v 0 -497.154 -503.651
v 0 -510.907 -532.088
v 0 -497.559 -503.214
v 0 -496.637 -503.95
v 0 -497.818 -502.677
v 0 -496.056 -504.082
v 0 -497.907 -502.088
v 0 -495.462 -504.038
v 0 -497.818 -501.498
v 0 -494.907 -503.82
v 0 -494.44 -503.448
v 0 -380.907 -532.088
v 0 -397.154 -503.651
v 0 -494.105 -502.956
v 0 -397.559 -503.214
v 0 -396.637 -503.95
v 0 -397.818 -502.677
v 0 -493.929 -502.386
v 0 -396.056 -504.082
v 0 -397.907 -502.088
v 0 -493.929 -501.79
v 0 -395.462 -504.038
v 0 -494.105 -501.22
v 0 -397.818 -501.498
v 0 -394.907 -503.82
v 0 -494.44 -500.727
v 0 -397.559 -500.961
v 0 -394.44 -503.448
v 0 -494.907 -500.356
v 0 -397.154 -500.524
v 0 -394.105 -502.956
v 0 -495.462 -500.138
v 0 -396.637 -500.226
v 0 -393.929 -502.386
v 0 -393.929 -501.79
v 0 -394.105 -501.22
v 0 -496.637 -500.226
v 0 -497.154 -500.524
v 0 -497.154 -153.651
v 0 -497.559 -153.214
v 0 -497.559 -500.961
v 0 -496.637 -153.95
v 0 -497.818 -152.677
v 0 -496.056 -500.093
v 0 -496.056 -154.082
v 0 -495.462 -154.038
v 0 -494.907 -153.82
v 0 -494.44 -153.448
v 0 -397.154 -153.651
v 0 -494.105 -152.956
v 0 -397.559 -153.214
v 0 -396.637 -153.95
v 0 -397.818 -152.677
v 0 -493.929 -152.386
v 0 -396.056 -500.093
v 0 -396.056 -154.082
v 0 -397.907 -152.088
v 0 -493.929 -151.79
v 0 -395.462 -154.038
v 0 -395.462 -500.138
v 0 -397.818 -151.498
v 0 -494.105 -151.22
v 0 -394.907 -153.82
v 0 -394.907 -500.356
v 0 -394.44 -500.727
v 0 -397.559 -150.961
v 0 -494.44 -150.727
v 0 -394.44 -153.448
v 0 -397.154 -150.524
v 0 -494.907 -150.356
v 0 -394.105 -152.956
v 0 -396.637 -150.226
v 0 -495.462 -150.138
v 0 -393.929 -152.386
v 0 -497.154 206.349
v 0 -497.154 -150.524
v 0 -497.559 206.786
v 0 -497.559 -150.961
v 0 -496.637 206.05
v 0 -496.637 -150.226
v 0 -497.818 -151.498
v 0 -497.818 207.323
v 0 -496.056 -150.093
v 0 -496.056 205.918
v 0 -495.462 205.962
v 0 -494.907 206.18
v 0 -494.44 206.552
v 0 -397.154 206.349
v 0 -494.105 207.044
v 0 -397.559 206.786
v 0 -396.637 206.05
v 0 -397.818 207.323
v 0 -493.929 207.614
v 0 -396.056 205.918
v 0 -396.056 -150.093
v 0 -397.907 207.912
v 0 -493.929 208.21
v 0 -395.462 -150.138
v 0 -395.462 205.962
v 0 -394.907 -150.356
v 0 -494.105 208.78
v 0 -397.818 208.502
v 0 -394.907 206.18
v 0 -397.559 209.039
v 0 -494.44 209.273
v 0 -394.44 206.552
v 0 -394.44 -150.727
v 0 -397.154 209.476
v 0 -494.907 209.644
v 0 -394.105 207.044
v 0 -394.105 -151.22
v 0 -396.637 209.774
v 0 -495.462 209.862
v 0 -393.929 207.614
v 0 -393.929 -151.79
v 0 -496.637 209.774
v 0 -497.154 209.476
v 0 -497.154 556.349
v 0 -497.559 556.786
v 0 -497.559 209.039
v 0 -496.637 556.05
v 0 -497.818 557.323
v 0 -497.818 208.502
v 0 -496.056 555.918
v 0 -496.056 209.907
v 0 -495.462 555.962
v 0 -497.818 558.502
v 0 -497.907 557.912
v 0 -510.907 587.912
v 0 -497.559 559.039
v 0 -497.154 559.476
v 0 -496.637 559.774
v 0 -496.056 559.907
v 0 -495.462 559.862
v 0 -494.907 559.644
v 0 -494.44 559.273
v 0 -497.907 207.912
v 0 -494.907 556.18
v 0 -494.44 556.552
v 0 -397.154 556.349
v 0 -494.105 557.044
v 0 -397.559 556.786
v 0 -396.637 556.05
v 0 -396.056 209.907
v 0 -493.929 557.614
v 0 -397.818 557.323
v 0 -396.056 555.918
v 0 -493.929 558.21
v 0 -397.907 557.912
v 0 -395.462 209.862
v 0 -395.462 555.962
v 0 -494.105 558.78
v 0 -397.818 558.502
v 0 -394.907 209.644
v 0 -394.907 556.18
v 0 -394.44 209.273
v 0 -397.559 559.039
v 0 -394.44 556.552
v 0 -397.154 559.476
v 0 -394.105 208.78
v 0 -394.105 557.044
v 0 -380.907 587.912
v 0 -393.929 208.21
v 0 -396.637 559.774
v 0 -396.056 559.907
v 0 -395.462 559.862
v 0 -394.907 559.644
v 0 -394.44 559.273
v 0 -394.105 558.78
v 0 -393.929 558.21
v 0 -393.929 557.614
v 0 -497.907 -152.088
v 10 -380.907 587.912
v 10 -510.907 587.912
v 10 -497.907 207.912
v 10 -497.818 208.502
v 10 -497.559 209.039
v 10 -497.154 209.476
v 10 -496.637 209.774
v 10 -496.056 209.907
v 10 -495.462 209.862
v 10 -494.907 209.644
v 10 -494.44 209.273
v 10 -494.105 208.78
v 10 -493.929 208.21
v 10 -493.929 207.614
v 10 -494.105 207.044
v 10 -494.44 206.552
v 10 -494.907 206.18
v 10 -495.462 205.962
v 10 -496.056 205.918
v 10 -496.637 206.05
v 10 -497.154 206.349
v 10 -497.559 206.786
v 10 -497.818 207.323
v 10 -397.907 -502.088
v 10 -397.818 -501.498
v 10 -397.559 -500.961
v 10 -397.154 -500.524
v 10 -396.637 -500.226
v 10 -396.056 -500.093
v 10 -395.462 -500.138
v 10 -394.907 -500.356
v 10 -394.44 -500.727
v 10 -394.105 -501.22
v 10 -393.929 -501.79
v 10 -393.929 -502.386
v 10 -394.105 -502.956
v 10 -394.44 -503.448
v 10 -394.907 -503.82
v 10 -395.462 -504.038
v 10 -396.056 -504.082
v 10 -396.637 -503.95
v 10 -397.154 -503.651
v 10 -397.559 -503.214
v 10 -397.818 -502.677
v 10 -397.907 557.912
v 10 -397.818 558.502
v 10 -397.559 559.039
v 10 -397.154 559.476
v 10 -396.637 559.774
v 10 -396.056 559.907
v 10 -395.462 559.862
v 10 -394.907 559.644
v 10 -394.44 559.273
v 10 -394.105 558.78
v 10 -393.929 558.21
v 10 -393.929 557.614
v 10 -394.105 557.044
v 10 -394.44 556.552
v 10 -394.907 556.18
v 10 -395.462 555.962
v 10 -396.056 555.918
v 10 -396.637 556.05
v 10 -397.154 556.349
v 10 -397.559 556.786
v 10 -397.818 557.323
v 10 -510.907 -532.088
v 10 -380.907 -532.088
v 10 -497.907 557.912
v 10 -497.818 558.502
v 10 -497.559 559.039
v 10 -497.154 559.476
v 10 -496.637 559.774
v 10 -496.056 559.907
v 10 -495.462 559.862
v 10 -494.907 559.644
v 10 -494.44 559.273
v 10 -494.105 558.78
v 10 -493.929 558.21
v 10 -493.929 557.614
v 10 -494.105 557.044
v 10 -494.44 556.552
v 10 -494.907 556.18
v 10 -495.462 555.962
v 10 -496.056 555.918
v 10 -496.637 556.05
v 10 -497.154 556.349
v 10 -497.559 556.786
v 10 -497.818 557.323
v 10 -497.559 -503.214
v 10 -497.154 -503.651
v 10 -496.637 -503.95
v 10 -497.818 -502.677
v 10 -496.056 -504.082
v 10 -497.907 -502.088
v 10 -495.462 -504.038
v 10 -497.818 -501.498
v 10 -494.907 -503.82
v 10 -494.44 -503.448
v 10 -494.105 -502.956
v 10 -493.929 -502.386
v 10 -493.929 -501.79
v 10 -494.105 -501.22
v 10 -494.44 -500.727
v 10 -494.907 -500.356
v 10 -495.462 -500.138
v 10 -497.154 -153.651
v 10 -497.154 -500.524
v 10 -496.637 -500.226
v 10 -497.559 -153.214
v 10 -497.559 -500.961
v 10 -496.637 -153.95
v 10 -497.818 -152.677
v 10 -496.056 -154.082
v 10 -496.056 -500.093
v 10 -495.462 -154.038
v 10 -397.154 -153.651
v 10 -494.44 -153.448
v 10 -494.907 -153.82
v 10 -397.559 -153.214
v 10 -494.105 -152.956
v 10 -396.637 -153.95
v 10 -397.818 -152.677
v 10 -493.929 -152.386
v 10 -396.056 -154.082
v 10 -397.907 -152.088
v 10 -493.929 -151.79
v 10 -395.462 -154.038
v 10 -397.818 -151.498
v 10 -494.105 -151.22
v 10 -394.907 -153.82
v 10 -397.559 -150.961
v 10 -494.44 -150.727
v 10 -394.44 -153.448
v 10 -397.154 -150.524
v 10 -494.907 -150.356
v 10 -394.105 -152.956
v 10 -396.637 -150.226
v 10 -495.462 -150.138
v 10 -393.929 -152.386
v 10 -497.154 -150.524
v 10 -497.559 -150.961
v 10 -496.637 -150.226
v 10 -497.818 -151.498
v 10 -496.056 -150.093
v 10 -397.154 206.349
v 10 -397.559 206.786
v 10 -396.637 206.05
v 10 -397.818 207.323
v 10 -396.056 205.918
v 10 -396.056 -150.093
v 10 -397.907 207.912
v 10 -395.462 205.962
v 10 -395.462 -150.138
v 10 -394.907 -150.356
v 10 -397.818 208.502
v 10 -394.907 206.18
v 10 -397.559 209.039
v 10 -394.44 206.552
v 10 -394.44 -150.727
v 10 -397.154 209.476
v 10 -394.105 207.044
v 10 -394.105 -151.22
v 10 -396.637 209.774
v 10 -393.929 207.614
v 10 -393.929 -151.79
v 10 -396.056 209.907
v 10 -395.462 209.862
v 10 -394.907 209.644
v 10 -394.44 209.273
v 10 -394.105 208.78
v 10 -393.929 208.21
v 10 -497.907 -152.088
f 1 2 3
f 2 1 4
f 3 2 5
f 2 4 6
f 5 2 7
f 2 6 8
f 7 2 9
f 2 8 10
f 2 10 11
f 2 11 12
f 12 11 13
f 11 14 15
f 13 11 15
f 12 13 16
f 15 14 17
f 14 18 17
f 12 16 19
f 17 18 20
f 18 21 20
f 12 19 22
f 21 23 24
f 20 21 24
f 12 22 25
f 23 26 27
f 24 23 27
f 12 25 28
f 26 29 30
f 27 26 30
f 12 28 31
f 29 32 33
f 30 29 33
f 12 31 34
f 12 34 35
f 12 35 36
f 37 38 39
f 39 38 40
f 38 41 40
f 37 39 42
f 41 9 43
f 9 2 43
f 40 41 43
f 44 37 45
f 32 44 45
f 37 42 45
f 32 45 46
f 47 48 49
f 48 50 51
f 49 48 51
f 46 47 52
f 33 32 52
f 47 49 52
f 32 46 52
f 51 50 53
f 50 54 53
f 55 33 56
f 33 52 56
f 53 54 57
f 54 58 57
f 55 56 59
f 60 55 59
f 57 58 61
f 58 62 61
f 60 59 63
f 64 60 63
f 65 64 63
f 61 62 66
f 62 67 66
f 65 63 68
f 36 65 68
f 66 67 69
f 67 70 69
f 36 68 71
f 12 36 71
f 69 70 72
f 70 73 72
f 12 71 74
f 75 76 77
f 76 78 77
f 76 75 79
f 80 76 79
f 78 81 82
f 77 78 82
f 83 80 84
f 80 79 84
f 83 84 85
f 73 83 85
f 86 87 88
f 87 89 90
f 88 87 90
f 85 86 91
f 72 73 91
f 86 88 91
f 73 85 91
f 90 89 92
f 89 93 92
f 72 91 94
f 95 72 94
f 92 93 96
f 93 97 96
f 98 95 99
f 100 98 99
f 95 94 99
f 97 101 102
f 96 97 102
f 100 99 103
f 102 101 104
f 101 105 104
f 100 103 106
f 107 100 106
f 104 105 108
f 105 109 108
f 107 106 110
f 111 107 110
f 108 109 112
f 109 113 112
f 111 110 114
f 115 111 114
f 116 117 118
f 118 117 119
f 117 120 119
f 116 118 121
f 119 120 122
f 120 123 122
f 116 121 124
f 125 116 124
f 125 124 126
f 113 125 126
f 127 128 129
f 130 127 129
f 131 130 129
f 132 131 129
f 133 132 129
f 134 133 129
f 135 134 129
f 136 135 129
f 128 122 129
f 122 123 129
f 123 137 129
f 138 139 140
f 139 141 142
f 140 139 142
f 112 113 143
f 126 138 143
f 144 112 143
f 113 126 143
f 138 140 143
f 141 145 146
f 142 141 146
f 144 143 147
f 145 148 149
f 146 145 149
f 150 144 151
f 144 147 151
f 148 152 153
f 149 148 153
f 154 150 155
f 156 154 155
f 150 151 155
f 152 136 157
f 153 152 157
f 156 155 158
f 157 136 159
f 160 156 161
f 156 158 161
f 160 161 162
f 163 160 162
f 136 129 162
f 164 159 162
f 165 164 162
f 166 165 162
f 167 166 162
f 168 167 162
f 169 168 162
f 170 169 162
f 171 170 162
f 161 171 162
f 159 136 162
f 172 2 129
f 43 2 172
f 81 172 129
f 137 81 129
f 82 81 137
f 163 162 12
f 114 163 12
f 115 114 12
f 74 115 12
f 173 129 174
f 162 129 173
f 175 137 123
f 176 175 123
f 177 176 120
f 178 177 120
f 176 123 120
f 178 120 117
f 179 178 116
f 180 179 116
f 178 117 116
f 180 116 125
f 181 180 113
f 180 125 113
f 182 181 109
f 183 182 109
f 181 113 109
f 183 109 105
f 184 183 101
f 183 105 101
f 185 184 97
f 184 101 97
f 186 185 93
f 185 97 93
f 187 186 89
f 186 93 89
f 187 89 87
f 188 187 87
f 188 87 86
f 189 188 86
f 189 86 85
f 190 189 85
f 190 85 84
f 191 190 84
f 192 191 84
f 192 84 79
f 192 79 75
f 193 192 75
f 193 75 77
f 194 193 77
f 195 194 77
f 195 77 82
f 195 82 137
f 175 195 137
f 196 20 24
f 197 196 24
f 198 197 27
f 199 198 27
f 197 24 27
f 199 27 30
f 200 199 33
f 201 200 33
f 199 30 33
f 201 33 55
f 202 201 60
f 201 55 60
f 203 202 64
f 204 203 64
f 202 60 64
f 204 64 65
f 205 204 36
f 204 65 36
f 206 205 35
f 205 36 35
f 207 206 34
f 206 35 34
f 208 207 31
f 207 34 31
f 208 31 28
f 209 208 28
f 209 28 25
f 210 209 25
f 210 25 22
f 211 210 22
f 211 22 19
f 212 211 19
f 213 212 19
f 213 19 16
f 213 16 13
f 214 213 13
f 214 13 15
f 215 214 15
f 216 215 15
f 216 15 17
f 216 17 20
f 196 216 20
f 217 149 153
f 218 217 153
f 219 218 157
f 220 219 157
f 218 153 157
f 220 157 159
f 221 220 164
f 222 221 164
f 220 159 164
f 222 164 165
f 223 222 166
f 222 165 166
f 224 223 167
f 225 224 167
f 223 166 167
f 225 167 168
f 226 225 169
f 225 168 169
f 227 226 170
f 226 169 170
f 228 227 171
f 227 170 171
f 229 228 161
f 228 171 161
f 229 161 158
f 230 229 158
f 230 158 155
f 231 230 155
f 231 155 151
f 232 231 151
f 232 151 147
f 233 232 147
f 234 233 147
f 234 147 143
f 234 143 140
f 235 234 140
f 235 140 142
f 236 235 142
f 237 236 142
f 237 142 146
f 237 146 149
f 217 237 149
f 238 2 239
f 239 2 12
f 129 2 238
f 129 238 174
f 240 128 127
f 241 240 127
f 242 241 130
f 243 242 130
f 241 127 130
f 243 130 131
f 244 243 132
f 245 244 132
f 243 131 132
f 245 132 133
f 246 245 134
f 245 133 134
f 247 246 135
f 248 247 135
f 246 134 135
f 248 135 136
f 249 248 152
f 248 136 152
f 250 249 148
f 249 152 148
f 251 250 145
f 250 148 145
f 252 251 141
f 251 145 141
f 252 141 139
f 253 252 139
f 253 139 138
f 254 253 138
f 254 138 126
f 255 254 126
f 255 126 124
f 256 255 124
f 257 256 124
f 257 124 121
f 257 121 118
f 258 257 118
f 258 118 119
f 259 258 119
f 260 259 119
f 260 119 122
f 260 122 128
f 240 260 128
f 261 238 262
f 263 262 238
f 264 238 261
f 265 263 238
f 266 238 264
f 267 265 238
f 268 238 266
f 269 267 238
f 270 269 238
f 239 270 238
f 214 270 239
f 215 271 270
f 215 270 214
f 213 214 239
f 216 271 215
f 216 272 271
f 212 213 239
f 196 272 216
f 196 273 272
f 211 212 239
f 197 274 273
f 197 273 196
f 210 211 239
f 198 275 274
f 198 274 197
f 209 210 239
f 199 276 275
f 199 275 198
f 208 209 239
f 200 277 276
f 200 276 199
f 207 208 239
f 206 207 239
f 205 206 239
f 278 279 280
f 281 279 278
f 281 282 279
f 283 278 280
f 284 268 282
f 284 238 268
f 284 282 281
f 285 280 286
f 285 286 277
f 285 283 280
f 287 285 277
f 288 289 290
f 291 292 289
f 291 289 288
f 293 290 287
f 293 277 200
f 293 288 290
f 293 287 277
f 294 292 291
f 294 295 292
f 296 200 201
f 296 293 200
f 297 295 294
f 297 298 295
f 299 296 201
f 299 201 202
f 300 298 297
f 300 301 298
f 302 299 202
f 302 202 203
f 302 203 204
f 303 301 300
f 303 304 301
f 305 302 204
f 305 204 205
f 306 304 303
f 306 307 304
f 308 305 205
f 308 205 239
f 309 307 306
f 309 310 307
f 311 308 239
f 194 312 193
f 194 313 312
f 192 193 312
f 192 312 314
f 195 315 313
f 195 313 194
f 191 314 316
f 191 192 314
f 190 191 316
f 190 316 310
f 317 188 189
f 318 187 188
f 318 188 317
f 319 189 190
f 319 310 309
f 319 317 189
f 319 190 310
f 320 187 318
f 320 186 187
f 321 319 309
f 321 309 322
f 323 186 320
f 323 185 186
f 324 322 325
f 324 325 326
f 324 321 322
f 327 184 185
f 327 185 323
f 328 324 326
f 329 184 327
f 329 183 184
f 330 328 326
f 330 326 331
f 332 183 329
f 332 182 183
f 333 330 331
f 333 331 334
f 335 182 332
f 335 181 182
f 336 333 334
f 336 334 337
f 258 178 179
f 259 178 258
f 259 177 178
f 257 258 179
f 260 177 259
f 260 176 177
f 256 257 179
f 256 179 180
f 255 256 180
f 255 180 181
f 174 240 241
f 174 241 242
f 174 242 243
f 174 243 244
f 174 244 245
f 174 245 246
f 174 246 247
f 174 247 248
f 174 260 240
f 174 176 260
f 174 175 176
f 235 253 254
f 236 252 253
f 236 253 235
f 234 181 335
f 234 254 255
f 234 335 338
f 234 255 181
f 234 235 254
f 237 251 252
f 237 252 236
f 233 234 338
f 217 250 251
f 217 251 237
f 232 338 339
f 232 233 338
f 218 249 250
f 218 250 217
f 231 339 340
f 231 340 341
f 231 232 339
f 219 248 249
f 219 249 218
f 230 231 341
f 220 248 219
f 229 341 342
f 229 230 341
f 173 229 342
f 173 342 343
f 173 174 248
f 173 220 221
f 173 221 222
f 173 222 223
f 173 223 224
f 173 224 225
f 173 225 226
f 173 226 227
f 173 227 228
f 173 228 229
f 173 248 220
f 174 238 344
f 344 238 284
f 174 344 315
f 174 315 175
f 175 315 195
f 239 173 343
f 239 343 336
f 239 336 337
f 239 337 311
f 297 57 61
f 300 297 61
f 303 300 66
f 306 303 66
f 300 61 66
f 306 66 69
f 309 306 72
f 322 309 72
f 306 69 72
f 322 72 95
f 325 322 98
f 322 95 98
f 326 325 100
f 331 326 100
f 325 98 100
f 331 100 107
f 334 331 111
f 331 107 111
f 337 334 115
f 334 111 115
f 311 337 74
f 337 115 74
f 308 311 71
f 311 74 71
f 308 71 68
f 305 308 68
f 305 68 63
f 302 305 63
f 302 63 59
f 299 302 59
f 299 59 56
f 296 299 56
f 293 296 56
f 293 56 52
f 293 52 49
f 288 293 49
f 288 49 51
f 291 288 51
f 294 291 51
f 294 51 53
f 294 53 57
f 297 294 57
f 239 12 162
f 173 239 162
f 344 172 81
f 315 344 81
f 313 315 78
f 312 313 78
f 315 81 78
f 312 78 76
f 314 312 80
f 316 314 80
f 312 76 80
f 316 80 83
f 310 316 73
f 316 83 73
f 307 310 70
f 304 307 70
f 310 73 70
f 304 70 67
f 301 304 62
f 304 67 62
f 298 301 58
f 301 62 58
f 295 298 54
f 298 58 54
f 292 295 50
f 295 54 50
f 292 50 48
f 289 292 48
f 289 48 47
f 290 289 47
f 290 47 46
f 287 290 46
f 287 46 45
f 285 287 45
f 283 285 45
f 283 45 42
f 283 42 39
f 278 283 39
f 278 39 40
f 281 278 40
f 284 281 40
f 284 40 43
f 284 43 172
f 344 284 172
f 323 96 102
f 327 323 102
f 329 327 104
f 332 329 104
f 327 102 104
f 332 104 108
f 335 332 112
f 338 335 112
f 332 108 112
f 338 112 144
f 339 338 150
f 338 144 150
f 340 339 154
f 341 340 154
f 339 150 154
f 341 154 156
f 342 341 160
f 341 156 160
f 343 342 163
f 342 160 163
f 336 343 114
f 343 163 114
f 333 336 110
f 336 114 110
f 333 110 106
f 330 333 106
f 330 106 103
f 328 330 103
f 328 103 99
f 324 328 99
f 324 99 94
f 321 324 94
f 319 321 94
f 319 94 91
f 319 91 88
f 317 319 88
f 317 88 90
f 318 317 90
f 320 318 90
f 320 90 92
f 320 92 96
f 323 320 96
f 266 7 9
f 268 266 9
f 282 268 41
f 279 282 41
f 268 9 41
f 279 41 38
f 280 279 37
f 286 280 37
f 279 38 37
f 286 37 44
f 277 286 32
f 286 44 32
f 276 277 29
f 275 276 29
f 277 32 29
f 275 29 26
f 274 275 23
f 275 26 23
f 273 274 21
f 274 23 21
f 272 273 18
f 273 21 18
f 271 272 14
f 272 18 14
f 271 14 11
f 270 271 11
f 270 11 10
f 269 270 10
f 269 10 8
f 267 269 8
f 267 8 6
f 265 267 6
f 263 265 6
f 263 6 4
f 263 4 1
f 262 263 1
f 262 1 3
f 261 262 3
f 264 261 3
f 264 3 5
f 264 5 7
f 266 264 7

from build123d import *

# Parameters (mm, degrees)
F0_W     = 130
F0_H     = 1120
F1_DEPTH = 10
F3_D     = 4


with BuildPart() as f1:
    # F0 (on Right) → F1 (new body)
    with BuildSketch(Plane.YZ):
        with Locations((-445.906552, 27.912206)):
            Rectangle(F0_W, F0_H)
    extrude(amount=F1_DEPTH)

    # F3 (through all)
    with Locations(Plane.YZ.offset(10)):
        with Locations((-495.906552, 557.912206), (-395.906552, 557.912206), (-395.906552, 207.912206), (-495.906552, 207.912206), (-395.906552, -152.087794), (-495.906552, -152.087794), (-495.906552, -502.087794), (-395.906552, -502.087794)):
            Hole(F3_D / 2)


solid = f1.part
